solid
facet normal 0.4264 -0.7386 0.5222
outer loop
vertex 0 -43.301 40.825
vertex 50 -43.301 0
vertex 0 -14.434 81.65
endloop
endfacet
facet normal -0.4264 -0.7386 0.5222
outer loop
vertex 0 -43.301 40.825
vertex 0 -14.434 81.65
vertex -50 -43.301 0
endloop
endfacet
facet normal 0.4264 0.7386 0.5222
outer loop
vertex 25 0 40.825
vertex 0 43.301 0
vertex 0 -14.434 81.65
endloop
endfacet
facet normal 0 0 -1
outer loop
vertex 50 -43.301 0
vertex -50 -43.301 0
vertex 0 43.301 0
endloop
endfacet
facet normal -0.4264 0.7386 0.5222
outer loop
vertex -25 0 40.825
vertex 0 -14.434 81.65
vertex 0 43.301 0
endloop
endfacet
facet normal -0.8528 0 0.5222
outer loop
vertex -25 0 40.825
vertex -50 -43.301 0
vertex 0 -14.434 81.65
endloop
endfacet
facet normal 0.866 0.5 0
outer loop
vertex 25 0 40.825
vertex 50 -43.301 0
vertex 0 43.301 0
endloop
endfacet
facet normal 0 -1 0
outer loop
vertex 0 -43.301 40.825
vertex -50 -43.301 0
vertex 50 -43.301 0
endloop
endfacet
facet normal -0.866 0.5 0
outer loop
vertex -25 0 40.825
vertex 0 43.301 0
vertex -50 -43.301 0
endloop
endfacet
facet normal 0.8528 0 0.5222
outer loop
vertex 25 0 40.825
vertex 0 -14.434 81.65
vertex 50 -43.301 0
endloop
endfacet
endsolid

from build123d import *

# Parameters (mm, degrees)
F1_DEPTH = 81.6496580928
F5_DEPTH = 100
F6_DEPTH = 100
F7_DEPTH = 100


with BuildPart() as f1:
    # F0 (on Top) → F1 (new body)
    with BuildSketch(Plane.XY):
        Polygon((-25, 0), (25, 0), (0, 43.3012701892), align=None)
        Polygon((-25, 0), (0, -43.3012701892), (25, 0), align=None)
        Polygon((-50, -43.3012701892), (0, -43.3012701892), (-25, 0), align=None)
        Polygon((0, -43.3012701892), (50, -43.3012701892), (25, 0), align=None)
    extrude(amount=F1_DEPTH)

    # F4 (on face) → F5 (cut)
    with BuildSketch(Plane(origin=(-18.75, 10.8253175473, 0), x_dir=(-0.5, -0.8660254038, 0), z_dir=(-0.8660254038, 0.5, 0))):
        Polygon((-37.5, 81.6496580928), (-37.5, 0), (12.5, 81.6496580928), align=None)
        Polygon((62.5, 81.6496580928), (12.5, 81.6496580928), (62.5, 0), align=None)
    extrude(amount=-F5_DEPTH, mode=Mode.SUBTRACT)

    # F2 (on face) → F6 (cut)
    with BuildSketch(Plane.XZ.offset(43.3012701892)):
        Polygon((-50, 81.6496580928), (-50, 0), (0, 81.6496580928), align=None)
        Polygon((50, 81.6496580928), (0, 81.6496580928), (50, 0), align=None)
    extrude(amount=-F6_DEPTH, mode=Mode.SUBTRACT)

    # F3 (on face) → F7 (cut)
    with BuildSketch(Plane(origin=(18.75, 10.8253175473, 0), x_dir=(-0.5, 0.8660254038, 0), z_dir=(0.8660254038, 0.5, 0))):
        Polygon((-62.5, 81.6496580928), (-62.5, 0), (-12.5, 81.6496580928), align=None)
        Polygon((37.5, 81.6496580928), (-12.5, 81.6496580928), (37.5, 0), align=None)
    extrude(amount=-F7_DEPTH, mode=Mode.SUBTRACT)


solid = f1.part
